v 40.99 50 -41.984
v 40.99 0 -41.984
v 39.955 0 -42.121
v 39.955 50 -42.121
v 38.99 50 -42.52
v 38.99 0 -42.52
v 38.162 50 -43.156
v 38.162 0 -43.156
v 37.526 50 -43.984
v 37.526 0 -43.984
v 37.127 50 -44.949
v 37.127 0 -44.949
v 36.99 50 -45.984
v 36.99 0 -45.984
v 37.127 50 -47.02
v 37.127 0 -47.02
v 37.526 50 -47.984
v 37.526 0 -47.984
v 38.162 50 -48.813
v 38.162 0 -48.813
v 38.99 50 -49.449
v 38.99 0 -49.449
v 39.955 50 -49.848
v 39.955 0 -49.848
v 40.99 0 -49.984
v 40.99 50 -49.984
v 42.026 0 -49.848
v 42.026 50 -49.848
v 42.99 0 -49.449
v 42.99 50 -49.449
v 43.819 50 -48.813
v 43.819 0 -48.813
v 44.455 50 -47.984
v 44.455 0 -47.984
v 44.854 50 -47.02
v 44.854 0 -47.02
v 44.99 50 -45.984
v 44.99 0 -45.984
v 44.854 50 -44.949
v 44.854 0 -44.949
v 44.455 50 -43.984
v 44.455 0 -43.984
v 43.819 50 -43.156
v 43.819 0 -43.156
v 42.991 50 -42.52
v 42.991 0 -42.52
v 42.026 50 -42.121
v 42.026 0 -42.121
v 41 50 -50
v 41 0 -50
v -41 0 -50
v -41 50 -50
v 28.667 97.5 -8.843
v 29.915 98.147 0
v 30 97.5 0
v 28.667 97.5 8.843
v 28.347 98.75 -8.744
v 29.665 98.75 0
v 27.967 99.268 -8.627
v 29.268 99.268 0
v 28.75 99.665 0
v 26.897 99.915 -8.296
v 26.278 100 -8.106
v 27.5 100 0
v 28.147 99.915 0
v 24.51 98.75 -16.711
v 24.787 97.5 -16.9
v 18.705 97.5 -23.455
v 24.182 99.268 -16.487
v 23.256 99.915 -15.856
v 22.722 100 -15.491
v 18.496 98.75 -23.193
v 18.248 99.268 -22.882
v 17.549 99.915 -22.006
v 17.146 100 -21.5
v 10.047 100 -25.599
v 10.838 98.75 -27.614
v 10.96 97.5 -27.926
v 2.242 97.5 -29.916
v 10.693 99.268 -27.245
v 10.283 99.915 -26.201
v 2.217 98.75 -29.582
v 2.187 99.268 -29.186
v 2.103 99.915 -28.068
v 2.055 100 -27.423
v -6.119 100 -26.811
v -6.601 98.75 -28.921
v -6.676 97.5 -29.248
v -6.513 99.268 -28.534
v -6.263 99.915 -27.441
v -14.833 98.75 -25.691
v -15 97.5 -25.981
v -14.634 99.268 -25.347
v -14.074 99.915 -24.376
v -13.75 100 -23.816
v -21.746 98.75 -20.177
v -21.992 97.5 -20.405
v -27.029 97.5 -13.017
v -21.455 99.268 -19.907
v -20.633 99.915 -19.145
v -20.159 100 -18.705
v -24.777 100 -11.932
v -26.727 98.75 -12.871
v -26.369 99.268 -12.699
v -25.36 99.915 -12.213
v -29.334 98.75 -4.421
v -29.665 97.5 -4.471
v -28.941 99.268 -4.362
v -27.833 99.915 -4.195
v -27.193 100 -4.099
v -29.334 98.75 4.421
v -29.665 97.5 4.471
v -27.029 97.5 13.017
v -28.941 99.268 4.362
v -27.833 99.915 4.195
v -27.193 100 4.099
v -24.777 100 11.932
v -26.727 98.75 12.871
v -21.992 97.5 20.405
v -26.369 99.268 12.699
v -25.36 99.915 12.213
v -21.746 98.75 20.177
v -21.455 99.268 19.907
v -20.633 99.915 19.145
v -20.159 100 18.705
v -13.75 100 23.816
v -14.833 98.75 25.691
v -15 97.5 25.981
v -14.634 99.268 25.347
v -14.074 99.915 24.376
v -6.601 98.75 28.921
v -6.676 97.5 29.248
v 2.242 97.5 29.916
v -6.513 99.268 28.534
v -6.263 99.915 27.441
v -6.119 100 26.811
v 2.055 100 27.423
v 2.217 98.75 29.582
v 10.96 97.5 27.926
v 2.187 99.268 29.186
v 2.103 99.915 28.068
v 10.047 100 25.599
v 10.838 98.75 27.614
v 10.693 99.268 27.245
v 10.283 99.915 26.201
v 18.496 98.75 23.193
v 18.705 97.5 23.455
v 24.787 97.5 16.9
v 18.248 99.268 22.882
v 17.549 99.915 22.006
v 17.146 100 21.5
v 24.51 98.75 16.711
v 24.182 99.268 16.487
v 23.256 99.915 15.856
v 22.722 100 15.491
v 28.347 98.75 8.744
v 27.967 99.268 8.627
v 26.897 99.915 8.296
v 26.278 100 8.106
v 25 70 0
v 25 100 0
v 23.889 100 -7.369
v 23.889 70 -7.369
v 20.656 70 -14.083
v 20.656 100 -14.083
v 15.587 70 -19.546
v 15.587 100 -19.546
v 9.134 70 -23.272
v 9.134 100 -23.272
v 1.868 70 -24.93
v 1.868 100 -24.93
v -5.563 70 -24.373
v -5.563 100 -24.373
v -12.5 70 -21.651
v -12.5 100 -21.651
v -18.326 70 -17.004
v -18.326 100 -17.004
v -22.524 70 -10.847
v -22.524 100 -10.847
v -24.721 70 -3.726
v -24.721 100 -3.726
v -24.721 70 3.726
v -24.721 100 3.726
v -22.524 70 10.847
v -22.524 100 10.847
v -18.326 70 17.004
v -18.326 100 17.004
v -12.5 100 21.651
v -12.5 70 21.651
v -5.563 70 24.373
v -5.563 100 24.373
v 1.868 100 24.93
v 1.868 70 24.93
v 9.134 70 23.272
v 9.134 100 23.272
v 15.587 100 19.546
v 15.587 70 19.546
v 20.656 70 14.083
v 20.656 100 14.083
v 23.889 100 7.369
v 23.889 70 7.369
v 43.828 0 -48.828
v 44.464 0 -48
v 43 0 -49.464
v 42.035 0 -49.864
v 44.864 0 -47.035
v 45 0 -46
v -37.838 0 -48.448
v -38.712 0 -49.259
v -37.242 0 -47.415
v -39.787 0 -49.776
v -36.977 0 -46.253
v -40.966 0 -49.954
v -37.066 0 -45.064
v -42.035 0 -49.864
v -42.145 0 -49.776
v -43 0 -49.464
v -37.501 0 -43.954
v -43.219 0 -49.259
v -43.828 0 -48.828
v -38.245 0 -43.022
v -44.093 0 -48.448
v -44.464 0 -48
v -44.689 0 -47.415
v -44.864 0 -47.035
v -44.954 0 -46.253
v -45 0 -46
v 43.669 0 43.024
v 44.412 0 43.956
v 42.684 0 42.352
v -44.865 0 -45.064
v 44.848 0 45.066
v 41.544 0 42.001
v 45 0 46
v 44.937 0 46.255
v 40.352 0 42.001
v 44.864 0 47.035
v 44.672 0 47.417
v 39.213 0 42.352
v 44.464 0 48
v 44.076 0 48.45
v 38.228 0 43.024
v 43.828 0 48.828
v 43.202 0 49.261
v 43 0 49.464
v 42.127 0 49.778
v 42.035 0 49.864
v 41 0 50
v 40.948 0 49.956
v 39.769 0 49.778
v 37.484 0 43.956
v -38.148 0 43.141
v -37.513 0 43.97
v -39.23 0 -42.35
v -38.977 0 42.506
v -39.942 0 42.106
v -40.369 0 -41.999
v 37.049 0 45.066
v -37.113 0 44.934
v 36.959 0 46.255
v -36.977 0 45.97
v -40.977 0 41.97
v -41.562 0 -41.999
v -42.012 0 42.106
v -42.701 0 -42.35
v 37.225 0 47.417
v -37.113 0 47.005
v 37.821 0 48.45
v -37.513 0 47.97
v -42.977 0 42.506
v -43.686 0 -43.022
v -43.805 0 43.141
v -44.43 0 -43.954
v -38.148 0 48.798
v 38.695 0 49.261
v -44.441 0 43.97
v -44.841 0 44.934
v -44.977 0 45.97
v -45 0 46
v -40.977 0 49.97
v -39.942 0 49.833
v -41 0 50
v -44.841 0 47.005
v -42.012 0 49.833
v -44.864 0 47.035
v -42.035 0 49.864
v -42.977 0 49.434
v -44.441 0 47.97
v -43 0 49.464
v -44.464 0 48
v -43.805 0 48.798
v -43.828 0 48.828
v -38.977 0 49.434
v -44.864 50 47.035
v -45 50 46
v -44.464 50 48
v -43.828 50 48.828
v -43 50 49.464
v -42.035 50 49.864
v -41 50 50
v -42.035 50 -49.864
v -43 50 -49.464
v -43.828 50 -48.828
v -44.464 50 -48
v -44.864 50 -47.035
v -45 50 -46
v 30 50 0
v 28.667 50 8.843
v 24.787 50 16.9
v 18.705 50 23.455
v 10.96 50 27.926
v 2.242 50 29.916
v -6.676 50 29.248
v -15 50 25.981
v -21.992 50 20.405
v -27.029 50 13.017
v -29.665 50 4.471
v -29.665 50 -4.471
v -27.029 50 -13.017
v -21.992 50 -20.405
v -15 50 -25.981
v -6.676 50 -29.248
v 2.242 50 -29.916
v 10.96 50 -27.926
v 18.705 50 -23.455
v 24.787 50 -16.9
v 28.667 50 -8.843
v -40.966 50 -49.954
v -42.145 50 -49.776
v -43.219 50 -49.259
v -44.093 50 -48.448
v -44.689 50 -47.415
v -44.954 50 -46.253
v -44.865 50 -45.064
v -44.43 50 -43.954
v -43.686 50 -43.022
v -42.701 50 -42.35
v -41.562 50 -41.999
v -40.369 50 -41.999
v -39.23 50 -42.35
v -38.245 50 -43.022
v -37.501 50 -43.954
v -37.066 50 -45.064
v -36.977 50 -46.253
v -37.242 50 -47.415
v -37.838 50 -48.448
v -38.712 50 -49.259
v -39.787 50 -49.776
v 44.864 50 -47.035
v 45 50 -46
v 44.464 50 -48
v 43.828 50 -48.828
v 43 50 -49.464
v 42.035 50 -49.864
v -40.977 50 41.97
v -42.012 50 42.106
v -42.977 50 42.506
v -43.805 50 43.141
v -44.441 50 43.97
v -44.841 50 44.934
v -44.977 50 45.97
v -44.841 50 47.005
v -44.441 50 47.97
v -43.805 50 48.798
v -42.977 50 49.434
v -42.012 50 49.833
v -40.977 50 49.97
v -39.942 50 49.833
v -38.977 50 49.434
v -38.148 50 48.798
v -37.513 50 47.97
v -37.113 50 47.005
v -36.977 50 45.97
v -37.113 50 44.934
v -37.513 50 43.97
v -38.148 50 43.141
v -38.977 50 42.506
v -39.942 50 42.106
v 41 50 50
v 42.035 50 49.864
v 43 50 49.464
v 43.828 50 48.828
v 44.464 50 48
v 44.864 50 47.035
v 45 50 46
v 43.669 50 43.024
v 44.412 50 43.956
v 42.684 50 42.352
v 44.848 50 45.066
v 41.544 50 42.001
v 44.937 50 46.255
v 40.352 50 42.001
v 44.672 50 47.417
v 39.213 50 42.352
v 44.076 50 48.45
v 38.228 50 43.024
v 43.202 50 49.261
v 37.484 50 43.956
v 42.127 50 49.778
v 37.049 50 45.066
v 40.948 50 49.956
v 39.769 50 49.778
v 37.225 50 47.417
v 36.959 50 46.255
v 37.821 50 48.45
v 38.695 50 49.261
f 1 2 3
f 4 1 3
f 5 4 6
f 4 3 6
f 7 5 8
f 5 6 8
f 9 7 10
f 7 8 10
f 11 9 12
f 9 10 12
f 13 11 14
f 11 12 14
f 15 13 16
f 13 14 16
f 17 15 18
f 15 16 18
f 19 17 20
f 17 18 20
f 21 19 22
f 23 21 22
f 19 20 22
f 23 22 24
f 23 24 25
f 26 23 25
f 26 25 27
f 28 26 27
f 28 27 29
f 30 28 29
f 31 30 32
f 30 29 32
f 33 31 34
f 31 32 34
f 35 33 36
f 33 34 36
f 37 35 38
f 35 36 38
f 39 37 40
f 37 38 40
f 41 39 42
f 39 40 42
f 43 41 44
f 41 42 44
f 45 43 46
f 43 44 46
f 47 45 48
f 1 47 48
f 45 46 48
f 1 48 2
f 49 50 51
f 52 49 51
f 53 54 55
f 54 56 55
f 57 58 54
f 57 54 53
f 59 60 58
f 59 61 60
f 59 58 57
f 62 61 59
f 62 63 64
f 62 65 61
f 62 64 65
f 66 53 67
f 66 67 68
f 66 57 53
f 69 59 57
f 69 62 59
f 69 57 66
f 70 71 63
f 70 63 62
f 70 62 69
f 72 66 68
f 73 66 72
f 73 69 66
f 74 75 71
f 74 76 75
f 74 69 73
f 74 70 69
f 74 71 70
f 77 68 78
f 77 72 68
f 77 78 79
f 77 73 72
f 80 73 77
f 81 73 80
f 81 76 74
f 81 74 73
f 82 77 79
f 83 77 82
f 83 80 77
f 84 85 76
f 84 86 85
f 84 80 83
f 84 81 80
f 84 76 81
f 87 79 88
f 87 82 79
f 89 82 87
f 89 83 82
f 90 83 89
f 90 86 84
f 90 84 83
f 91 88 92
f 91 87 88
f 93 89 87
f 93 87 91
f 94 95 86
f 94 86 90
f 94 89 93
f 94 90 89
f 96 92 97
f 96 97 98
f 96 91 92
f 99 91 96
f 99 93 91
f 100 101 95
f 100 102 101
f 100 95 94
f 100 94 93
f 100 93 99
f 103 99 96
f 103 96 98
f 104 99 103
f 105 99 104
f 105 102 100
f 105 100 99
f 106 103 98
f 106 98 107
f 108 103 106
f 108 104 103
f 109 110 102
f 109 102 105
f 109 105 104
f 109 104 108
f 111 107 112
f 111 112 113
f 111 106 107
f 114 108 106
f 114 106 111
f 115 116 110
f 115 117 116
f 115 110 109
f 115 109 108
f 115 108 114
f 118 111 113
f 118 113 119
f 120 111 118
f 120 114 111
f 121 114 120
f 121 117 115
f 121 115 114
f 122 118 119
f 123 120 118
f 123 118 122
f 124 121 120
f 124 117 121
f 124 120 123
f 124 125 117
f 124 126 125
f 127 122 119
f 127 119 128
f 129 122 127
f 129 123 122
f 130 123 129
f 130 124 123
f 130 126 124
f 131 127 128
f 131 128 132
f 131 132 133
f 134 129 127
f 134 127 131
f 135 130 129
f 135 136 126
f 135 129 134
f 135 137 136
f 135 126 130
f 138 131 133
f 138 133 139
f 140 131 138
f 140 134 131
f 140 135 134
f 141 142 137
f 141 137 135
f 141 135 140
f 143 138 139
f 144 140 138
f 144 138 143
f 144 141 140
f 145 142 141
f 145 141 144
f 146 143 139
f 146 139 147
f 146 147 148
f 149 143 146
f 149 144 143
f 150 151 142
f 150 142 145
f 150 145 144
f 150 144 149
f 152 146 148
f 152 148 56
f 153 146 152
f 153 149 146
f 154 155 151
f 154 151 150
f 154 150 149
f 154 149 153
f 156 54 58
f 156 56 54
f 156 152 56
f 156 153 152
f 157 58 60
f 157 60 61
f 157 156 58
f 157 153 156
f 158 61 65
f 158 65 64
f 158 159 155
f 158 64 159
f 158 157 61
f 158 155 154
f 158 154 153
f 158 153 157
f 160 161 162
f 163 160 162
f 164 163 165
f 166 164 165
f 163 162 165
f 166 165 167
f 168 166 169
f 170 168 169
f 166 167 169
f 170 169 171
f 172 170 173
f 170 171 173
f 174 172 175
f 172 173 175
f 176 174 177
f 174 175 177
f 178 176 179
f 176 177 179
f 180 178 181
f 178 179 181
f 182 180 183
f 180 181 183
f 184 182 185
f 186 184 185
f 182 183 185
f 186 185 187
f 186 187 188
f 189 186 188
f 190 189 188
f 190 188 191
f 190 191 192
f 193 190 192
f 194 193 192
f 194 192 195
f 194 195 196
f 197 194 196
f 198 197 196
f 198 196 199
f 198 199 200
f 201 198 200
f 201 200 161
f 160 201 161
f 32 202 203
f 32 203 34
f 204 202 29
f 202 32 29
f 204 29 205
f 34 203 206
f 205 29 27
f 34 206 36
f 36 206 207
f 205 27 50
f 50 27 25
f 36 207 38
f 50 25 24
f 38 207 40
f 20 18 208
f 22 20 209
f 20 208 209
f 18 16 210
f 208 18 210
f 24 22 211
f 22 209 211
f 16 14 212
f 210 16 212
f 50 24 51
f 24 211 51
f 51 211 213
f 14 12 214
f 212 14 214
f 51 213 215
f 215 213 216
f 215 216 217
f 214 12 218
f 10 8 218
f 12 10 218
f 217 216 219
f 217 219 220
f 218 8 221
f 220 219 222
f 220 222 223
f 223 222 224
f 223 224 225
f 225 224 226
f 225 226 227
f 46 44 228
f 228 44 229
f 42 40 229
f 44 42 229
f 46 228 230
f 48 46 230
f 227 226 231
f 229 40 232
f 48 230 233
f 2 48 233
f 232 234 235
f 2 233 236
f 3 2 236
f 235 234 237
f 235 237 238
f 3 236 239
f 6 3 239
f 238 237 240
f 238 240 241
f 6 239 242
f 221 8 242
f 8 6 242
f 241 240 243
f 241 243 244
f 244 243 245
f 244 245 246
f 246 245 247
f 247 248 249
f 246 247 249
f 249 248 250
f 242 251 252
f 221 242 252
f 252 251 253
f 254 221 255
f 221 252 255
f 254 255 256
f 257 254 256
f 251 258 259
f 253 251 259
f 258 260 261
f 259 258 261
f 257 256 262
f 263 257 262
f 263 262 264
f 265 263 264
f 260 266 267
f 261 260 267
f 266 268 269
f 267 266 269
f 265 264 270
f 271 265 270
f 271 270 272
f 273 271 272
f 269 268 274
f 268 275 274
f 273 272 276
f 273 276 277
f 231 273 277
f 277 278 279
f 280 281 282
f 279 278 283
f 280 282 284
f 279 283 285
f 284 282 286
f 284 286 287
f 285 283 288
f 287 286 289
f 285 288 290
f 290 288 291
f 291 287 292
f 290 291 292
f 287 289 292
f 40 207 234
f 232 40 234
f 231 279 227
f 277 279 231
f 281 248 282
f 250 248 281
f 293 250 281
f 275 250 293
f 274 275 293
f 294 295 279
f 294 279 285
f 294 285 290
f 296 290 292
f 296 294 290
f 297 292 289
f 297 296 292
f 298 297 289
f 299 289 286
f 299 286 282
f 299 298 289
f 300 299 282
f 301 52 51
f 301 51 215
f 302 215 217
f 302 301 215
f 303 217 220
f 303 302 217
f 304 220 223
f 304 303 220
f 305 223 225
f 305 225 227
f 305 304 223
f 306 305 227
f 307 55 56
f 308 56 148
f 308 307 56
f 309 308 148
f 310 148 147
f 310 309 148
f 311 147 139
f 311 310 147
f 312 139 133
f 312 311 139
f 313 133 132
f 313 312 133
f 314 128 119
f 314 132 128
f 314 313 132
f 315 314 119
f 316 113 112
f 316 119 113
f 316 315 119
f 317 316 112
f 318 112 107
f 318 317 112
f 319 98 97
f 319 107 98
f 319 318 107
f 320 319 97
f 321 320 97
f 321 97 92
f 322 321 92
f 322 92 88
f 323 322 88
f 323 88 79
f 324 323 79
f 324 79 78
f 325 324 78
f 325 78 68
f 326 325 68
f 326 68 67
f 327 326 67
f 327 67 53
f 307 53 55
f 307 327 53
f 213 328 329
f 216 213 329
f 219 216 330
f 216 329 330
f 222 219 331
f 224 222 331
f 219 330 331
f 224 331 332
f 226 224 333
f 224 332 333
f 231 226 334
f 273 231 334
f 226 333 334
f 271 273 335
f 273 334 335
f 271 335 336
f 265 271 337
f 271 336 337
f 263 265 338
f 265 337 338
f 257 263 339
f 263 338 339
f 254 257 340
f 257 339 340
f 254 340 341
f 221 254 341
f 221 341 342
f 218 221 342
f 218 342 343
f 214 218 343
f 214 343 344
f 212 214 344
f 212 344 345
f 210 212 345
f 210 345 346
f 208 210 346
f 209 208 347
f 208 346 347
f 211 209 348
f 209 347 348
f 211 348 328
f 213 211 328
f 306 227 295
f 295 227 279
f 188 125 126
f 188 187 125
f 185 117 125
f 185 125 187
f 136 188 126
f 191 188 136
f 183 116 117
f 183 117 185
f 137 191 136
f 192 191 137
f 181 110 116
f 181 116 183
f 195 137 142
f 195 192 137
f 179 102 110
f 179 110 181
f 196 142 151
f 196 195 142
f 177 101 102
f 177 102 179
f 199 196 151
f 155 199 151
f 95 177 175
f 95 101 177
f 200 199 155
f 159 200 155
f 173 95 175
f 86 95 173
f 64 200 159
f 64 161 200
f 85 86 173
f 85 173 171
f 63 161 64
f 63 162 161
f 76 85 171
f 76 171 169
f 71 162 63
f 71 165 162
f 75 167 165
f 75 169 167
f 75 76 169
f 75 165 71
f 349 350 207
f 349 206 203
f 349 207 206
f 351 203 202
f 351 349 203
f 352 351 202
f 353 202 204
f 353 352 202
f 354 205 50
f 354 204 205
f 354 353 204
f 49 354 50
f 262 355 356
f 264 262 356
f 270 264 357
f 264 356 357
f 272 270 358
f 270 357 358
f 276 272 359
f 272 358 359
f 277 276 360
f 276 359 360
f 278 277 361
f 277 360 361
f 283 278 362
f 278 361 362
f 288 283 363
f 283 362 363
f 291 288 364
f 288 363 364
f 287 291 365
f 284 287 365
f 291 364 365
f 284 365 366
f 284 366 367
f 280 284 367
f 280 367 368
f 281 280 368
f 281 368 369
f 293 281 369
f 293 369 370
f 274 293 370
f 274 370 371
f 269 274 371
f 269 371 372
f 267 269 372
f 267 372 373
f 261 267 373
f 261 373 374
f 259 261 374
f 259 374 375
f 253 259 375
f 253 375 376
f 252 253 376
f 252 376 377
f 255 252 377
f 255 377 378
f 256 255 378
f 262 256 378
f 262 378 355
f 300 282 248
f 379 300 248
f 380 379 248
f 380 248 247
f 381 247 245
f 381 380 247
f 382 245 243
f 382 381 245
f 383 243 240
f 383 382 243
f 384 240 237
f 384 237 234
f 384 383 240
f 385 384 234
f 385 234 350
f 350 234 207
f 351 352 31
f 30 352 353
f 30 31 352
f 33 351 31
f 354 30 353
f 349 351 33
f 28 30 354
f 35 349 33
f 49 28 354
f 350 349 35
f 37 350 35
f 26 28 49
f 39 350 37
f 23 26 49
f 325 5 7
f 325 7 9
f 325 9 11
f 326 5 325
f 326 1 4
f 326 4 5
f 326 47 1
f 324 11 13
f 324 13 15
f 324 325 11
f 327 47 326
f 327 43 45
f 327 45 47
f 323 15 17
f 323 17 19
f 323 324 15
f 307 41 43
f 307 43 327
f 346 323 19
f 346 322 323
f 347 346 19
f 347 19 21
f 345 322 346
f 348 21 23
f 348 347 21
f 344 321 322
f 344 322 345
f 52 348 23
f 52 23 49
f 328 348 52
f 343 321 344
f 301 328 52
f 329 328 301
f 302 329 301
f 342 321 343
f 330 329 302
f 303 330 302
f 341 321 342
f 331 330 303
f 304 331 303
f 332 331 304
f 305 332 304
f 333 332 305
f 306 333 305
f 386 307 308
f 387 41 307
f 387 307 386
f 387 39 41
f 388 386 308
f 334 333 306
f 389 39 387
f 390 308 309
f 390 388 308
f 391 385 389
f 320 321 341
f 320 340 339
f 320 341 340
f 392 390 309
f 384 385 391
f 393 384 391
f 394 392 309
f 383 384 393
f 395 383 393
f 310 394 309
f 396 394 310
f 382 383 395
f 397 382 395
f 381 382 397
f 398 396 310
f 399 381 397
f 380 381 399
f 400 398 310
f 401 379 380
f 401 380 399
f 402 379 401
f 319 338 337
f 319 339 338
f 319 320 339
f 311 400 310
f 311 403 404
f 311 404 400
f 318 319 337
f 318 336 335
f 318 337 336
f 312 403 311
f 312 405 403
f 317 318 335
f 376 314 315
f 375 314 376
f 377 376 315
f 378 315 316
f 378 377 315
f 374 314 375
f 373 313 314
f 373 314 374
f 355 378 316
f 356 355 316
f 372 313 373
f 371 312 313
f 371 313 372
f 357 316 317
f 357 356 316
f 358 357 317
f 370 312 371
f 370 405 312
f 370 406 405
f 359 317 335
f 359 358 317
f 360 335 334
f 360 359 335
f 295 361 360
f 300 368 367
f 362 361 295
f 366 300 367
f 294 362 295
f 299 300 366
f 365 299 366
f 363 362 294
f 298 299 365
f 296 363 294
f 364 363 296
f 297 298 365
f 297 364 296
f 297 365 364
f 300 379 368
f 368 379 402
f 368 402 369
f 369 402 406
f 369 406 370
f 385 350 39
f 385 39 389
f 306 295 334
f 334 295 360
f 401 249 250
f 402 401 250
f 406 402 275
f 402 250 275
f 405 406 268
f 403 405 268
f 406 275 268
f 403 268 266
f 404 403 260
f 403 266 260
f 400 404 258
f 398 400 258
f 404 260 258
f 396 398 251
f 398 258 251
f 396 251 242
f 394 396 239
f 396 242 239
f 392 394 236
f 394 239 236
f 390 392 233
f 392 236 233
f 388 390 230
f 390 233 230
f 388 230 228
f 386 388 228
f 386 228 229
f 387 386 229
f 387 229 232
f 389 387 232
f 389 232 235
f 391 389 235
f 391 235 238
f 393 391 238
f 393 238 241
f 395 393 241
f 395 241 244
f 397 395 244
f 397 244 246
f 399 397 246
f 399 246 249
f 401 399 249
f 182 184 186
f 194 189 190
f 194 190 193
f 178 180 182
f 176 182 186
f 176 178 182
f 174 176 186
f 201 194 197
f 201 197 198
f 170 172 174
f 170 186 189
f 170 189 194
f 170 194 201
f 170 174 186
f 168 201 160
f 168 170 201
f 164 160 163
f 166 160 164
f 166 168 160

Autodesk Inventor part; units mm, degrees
ref_plane "YZ Plane" through (0, 0, 0) normal (1, 0, 0) x (0, 1, 0)
ref_plane "XZ Plane" through (0, 0, 0) normal (0, 1, 0) x (-1, 0, 0)
ref_plane "XY Plane" through (0, 0, 0) normal (0, 0, 1) x (1, 0, 0)
sketch "Sketch2" plane through (0, 0, 0) normal (0, 1, 0) x (-1, 0, 0)
  line L0 (45, 50) -> (-45, 50)
  line L1 (-45, 50) -> (-45, -50)
  line L2 (-45, -50) -> (45, -50)
  line L3 (45, -50) -> (45, 50)
  line L4 (45, 50) -> (-45, -50) construction
  line L5 (-45, 50) -> (45, -50) construction
  point P0 (0, 0)
  dimension "d0" = 90
  dimension "d1" = 100
extrude "Extrusion1" add sketch "Sketch2" along normal blind 50
sketch "Sketch4" plane through (0, 50, 0) normal (0, 1, 0) x (1, 0, 0)
  point P0 (0, 0)
  point P1 (40.9905, 45.9844)
hole "Hole1" at (40.9905, 50, -45.9844) direction (0, -1, 0) diameter 8 end through all
sketch "Sketch5" plane through (0, 0, 0) normal (0, -1, 0) x (1, 0, 0)
  point P0 (0, 0)
  point P1 (-40.9769, 45.9697)
hole "Hole2" at (-40.9769, 0, 45.9697) direction (0, 1, 0) diameter 8 end through all
sketch "Sketch6" plane through (0, 0, 0) normal (0, -1, 0) x (1, 0, 0)
  point P0 (0, 0)
  point P1 (-40.9656, -45.9539)
hole "Hole3" at (-40.9656, 0, -45.9539) direction (0, 1, 0) diameter 8 end through all
sketch "Sketch7" plane through (0, 50, 0) normal (0, 1, 0) x (1, 0, 0)
  point P0 (0, 0)
  point P1 (40.9483, -45.9561)
hole "Hole4" at (40.9483, 50, 45.9561) direction (0, -1, 0) diameter 8 end through all
thread "Thread1" size "M8x1.25" class "6H" standard "ANSI Metric M Profile" full length
thread "Thread2" size "M8x1.25" class "6H" standard "ANSI Metric M Profile" full length
thread "Thread3" size "M8x1.25" class "6H" standard "ANSI Metric M Profile" full length
thread "Thread4" size "M8x1.25" class "6H" standard "ANSI Metric M Profile" full length
fillet "Fillet1" radius 4 1 edges at (45, 25, -50)
fillet "Fillet2" radius 4 1 edges at (-45, 25, -50)
fillet "Fillet3" radius 4 1 edges at (-45, 25, 50)
fillet "Fillet4" radius 4 1 edges at (45, 25, 50)
sketch "Sketch9" plane through (0, 50, 0) normal (0, 1, 0) x (1, 0, 0)
  circle A0 centre (0, 0) radius 30
  dimension "d44" = 60
extrude "Extrusion2" add sketch "Sketch9" along normal blind 50
sketch "Sketch10" plane through (0, 100, 0) normal (0, 1, 0) x (1, 0, 0)
  circle A0 centre (0, 0) radius 25
  dimension "d47" = 50
extrude "Extrusion3" cut sketch "Sketch10" against normal blind 30
thread "Thread5" size "M50x4" class "6H" standard "ANSI Metric M Profile" full length
fillet "Fillet5" radius 2.5 1 edges at (-30, 100, 0)
properties part number "Práctica 1 - Melany Escobar"
